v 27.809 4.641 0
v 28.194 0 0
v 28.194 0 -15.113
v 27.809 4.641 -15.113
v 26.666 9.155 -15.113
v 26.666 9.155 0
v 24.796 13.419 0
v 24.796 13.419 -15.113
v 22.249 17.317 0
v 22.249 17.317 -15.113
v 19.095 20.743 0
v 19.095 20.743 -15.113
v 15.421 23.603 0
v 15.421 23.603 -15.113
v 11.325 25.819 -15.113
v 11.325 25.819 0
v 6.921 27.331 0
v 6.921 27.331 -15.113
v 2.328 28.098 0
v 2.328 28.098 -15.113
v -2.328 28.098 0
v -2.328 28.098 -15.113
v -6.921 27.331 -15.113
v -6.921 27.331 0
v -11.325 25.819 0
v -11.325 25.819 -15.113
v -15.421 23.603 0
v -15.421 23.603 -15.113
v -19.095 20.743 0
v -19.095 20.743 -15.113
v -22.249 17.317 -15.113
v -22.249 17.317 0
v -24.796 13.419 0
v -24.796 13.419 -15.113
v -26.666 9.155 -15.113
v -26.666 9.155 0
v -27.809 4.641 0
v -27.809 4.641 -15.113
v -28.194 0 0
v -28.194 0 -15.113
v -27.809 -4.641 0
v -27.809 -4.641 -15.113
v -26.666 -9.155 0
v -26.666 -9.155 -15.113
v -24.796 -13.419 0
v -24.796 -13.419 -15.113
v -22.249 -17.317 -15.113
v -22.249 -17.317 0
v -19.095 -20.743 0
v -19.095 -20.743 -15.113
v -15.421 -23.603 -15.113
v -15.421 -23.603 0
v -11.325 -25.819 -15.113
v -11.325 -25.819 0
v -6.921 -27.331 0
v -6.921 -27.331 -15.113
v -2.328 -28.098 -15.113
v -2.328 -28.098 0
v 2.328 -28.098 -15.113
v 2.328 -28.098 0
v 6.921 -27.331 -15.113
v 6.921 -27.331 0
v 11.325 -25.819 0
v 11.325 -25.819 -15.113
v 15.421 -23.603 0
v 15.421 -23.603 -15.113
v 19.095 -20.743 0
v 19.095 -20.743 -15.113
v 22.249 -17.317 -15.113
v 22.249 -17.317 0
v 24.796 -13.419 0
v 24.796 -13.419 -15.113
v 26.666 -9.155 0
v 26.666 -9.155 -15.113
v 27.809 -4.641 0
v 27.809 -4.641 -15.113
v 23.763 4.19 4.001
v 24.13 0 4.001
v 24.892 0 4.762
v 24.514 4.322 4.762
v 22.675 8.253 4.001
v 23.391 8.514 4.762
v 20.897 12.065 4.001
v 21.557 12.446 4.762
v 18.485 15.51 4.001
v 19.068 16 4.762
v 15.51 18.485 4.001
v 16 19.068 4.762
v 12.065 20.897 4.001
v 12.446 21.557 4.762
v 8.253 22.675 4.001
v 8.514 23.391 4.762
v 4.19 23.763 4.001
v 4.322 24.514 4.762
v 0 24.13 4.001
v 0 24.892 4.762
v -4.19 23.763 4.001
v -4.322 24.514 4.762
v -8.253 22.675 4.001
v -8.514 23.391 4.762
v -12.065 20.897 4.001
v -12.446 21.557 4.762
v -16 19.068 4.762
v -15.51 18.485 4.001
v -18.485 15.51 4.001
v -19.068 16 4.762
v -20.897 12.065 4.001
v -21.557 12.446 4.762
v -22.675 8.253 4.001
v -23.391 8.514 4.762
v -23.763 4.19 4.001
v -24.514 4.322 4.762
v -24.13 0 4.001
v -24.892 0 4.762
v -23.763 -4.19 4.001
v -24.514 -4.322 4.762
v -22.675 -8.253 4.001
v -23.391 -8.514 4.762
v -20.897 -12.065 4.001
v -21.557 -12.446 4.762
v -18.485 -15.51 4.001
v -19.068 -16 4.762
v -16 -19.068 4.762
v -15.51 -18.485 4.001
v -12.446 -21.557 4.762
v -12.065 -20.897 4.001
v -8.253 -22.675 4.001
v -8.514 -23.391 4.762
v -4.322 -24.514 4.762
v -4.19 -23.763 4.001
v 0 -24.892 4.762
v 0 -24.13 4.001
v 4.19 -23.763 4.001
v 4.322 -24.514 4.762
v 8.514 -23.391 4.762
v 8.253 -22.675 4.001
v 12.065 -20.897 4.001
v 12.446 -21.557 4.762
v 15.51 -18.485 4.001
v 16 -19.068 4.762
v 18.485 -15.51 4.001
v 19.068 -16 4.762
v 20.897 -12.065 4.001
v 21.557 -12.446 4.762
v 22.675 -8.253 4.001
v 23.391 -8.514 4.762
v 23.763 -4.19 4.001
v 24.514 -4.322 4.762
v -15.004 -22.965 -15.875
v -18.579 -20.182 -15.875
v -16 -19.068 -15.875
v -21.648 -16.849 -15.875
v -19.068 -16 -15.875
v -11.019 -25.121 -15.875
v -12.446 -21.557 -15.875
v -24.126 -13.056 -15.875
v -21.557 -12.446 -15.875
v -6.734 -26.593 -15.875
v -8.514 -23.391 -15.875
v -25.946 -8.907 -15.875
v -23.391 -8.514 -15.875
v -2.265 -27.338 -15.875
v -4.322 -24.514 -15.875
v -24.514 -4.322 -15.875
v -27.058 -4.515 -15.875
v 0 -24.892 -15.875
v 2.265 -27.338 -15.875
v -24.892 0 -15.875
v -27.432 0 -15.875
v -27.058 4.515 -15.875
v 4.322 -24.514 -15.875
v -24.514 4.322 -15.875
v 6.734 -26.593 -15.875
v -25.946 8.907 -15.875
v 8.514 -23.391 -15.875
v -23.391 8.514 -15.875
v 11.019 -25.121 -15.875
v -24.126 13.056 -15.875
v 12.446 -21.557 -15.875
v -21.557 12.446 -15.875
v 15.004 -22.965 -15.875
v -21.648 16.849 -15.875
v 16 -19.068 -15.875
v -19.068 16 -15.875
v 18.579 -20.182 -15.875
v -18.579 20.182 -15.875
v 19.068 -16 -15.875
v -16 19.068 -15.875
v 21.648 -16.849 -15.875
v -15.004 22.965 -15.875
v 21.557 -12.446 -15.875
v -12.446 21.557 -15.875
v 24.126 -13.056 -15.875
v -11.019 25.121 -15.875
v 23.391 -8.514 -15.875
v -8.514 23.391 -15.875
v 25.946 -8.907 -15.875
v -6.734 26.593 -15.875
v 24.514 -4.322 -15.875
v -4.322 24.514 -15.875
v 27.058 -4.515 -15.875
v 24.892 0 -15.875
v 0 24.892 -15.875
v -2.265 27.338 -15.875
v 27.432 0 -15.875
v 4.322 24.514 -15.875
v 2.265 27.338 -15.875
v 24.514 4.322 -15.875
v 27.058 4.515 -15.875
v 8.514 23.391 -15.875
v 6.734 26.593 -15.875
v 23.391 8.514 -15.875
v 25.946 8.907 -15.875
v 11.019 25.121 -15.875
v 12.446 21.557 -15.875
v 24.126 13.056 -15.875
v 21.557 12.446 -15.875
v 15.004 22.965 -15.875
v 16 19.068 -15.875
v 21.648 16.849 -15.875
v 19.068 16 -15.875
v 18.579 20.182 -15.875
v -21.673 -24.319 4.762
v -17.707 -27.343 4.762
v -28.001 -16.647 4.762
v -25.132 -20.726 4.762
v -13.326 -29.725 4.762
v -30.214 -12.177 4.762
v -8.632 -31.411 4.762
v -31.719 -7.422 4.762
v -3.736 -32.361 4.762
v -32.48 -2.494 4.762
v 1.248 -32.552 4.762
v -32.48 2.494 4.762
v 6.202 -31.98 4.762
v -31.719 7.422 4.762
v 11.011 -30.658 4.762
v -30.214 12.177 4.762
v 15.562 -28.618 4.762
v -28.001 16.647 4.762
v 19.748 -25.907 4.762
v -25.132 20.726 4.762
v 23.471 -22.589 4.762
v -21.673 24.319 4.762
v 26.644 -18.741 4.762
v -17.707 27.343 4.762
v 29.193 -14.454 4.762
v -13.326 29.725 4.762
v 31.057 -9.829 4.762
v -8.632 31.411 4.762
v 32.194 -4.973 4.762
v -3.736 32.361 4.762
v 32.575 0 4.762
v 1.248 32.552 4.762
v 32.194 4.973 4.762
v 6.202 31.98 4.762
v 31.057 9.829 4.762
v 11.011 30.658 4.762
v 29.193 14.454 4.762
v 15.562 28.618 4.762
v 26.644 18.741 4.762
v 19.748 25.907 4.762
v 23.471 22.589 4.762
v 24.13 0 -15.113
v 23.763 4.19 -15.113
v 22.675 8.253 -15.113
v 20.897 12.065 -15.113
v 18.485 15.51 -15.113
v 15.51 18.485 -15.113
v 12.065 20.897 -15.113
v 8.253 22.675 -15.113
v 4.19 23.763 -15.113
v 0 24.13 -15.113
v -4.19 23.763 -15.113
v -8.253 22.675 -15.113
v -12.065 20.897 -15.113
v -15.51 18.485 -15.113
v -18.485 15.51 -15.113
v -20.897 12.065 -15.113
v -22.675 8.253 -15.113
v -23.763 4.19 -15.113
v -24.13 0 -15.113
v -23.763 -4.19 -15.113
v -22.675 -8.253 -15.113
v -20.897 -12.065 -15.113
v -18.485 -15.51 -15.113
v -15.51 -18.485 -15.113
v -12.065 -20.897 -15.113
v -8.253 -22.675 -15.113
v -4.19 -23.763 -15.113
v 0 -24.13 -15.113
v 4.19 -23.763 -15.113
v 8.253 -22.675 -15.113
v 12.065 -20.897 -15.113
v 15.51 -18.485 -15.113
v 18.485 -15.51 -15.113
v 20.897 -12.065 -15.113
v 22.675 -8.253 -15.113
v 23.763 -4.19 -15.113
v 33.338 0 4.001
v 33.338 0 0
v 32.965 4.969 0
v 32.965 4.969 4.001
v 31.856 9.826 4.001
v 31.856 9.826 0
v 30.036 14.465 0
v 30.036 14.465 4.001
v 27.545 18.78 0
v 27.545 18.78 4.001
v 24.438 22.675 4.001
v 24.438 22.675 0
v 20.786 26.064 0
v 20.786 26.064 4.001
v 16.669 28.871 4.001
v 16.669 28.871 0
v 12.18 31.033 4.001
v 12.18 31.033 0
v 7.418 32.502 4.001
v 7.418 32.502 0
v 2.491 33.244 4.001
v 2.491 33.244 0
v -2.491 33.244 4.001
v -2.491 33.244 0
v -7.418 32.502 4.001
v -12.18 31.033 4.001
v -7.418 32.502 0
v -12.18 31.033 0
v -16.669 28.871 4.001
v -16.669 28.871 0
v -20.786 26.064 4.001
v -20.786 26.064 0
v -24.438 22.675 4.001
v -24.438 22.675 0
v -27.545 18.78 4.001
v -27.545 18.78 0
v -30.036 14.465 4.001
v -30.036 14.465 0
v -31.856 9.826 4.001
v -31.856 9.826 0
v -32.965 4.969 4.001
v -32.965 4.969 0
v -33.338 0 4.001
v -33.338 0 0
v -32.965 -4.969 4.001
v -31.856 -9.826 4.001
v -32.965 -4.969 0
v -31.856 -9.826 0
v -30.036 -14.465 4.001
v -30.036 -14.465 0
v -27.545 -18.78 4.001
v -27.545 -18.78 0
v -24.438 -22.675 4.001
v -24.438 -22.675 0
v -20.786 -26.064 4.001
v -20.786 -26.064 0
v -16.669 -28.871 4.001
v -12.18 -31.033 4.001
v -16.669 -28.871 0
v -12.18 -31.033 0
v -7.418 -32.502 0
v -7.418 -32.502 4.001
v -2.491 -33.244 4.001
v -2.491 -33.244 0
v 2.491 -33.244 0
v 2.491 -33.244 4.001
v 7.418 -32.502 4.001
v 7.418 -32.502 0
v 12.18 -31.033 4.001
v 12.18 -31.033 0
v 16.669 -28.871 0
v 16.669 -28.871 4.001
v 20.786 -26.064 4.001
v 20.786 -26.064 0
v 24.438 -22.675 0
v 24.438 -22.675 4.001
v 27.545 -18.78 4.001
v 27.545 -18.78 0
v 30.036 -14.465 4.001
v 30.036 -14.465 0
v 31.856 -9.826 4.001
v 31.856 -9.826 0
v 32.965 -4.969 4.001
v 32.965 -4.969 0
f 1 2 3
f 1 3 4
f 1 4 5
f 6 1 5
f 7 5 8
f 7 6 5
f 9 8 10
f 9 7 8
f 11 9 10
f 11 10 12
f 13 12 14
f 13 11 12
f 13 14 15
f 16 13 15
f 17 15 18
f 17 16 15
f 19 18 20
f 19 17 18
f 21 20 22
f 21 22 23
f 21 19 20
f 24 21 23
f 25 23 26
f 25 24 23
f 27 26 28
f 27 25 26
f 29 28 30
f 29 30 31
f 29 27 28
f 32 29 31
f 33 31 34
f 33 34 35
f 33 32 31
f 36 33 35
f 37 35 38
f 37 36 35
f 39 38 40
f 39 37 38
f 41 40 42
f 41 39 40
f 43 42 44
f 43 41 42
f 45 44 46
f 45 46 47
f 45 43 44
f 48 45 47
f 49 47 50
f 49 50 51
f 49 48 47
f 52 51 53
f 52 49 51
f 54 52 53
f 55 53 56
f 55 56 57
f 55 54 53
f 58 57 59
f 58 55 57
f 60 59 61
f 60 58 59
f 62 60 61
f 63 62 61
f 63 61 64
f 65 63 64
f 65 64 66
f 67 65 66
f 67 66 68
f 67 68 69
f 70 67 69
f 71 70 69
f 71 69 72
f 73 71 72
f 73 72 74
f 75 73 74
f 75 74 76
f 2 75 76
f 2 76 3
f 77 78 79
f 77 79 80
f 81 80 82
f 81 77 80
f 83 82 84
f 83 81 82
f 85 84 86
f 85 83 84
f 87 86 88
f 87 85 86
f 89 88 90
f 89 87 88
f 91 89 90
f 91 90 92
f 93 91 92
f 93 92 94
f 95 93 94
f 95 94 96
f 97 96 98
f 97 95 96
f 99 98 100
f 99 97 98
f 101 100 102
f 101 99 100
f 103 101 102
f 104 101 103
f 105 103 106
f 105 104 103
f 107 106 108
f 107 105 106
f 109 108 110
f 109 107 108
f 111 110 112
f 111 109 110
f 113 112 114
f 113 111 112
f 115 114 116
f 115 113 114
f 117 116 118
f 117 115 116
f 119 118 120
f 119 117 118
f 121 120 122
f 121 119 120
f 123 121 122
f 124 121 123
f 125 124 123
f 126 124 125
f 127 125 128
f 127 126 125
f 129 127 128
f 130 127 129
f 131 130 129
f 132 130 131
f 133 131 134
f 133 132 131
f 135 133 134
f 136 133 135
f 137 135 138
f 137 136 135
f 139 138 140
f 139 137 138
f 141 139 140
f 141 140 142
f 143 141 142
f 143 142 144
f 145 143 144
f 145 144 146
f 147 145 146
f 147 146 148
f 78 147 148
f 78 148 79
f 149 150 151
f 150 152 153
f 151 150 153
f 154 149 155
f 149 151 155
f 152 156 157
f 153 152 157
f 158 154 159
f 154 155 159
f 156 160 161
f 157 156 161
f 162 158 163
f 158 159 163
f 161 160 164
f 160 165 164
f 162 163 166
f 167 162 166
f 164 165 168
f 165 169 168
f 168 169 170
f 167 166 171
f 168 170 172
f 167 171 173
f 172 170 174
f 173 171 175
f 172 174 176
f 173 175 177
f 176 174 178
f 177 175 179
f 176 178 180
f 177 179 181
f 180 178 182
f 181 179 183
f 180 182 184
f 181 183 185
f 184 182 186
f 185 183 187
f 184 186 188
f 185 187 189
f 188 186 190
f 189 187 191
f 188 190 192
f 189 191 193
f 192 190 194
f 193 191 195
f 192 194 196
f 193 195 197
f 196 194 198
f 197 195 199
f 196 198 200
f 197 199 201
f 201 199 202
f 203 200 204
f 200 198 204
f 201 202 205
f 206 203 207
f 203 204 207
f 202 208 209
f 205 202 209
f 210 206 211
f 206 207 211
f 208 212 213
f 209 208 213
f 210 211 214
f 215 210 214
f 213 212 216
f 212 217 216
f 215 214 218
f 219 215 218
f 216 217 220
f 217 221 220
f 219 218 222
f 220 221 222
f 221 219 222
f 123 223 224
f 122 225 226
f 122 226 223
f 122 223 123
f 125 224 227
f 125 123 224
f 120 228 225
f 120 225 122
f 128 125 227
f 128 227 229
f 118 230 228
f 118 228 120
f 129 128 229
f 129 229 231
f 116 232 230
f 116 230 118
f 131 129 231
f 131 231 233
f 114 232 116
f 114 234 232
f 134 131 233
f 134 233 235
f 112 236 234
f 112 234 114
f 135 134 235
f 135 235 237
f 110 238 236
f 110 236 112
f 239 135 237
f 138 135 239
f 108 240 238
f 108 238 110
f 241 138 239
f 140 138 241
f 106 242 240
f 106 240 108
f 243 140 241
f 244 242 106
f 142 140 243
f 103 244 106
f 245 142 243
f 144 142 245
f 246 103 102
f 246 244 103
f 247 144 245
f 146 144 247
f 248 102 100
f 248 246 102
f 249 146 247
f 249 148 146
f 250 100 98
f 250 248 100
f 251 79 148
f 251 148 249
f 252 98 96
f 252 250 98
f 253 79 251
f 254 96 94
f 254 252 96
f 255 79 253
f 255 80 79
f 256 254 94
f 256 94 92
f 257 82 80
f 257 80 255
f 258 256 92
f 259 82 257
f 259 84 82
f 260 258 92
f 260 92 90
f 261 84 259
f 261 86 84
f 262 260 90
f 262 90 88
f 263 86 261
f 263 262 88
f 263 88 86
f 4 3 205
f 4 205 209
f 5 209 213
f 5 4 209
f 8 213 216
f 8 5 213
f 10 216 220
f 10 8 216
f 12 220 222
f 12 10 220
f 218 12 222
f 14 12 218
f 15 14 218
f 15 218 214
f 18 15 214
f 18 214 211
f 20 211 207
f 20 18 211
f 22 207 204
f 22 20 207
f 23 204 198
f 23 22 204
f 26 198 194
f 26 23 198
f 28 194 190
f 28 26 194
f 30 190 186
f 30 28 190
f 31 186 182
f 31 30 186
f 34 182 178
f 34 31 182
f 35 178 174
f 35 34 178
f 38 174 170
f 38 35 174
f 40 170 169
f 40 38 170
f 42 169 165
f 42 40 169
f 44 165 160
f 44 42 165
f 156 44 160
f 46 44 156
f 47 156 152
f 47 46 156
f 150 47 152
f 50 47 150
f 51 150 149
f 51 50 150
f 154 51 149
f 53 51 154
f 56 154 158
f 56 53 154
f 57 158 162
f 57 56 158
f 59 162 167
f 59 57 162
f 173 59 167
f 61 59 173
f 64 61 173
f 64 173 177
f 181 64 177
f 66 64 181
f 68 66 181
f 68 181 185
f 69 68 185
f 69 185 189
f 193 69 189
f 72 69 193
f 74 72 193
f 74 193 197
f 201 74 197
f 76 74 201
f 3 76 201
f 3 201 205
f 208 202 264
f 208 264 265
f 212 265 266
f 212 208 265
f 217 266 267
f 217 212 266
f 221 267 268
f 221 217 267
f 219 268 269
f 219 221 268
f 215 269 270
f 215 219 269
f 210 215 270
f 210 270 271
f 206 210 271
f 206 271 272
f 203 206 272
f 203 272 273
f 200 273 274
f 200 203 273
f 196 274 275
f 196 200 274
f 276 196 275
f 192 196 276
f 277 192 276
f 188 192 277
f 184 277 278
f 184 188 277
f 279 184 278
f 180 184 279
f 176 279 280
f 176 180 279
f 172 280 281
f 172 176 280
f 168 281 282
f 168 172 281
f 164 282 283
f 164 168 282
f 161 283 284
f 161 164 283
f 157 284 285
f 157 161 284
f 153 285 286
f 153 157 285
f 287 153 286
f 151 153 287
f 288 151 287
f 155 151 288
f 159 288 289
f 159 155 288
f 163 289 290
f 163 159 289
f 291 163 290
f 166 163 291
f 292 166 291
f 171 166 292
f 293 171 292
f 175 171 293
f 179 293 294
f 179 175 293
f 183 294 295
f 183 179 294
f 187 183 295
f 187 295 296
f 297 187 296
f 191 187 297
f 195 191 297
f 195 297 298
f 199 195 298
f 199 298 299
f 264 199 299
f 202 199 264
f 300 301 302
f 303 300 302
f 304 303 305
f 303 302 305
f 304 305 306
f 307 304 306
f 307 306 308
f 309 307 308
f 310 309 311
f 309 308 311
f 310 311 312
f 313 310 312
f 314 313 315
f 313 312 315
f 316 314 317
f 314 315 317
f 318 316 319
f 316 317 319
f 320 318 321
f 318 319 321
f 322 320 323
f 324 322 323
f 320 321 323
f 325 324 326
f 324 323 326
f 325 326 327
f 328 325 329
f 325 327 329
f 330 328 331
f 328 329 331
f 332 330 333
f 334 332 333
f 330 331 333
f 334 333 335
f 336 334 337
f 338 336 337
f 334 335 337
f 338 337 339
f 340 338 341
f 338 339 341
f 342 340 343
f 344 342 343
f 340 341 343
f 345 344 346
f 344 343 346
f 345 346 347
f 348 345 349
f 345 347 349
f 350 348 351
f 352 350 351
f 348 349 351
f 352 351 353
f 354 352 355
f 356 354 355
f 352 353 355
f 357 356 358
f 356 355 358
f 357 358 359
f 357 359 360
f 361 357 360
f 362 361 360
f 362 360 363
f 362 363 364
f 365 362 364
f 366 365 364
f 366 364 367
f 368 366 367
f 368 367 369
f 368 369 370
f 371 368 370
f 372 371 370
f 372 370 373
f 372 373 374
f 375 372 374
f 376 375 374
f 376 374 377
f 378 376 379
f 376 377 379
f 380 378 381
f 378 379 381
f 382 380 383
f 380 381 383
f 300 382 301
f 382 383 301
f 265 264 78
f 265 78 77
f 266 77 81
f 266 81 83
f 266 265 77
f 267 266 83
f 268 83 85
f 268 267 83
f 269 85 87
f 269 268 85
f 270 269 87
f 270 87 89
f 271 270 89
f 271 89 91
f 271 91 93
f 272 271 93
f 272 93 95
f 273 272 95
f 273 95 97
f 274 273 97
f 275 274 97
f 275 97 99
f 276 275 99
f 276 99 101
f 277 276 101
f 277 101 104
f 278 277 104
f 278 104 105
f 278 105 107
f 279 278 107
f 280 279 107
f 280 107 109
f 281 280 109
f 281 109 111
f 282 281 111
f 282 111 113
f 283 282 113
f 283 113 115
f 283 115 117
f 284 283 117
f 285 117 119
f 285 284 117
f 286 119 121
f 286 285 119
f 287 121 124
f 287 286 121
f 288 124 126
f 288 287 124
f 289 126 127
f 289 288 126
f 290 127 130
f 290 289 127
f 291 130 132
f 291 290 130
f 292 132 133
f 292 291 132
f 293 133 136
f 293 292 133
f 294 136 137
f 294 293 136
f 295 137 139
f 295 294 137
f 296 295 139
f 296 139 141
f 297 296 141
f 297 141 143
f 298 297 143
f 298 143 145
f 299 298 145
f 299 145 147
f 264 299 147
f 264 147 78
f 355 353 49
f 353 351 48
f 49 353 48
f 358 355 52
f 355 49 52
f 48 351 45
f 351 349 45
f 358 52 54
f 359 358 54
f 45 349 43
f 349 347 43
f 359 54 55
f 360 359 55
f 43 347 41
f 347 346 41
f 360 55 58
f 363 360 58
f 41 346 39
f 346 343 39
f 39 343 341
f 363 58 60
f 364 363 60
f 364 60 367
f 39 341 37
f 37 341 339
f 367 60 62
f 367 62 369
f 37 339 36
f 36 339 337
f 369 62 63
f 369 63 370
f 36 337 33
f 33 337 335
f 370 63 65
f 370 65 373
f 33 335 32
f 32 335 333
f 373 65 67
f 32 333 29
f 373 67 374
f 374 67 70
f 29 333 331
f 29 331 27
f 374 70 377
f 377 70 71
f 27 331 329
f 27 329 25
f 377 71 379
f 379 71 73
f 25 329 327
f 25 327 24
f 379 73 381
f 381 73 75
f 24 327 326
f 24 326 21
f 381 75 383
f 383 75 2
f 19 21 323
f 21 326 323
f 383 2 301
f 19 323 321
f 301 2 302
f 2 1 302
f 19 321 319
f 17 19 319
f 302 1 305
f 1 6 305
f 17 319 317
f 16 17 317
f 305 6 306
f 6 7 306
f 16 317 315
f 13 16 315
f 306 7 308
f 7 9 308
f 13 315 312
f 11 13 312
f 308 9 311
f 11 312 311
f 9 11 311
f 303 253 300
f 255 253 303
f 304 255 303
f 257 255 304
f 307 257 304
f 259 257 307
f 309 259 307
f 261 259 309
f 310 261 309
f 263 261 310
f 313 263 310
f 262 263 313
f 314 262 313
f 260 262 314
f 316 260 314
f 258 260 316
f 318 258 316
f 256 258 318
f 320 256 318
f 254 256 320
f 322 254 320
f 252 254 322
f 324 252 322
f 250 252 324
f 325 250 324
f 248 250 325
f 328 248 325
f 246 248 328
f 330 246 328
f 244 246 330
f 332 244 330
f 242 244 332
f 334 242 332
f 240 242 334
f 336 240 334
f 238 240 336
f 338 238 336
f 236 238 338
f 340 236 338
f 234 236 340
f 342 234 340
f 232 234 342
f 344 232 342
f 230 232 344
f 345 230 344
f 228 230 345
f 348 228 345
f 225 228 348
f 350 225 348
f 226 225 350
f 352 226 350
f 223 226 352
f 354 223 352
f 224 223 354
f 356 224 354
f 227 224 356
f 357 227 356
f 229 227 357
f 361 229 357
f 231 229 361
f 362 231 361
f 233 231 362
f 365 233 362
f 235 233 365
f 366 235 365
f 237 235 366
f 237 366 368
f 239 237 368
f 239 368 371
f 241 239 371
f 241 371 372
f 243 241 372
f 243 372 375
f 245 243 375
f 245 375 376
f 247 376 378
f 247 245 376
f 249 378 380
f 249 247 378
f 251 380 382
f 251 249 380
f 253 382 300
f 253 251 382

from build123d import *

# Parameters (mm, degrees)
F0_R     = 28.194
F0_R_2   = 24.13
F1_DEPTH = 15.875
F2_R     = 33.3375
F2_R_2   = 24.13
F3_DEPTH = 4.7625
F4_SIZE  = 0.762


with BuildPart() as f1:
    # F0 (on Top) → F1 (new body)
    with BuildSketch(Plane.XY):
        Circle(F0_R)
        Circle(F0_R_2, mode=Mode.SUBTRACT)
    extrude(amount=-F1_DEPTH)

    # F2 (on Top) → F3 (join)
    with BuildSketch(Plane.XY):
        Circle(F2_R)
        Circle(F2_R_2, mode=Mode.SUBTRACT)
    extrude(amount=F3_DEPTH)

    # F4
    f4_edges = [f1.edges().sort_by_distance(p)[0] for p in [
        (-33.3375, 0, 4.7625),
        (-24.13, 0, 4.7625),
        (-28.194, 0, -15.875),
        (-24.13, 0, -15.875),
    ]]
    chamfer(f4_edges, length=F4_SIZE)


solid = f1.part
